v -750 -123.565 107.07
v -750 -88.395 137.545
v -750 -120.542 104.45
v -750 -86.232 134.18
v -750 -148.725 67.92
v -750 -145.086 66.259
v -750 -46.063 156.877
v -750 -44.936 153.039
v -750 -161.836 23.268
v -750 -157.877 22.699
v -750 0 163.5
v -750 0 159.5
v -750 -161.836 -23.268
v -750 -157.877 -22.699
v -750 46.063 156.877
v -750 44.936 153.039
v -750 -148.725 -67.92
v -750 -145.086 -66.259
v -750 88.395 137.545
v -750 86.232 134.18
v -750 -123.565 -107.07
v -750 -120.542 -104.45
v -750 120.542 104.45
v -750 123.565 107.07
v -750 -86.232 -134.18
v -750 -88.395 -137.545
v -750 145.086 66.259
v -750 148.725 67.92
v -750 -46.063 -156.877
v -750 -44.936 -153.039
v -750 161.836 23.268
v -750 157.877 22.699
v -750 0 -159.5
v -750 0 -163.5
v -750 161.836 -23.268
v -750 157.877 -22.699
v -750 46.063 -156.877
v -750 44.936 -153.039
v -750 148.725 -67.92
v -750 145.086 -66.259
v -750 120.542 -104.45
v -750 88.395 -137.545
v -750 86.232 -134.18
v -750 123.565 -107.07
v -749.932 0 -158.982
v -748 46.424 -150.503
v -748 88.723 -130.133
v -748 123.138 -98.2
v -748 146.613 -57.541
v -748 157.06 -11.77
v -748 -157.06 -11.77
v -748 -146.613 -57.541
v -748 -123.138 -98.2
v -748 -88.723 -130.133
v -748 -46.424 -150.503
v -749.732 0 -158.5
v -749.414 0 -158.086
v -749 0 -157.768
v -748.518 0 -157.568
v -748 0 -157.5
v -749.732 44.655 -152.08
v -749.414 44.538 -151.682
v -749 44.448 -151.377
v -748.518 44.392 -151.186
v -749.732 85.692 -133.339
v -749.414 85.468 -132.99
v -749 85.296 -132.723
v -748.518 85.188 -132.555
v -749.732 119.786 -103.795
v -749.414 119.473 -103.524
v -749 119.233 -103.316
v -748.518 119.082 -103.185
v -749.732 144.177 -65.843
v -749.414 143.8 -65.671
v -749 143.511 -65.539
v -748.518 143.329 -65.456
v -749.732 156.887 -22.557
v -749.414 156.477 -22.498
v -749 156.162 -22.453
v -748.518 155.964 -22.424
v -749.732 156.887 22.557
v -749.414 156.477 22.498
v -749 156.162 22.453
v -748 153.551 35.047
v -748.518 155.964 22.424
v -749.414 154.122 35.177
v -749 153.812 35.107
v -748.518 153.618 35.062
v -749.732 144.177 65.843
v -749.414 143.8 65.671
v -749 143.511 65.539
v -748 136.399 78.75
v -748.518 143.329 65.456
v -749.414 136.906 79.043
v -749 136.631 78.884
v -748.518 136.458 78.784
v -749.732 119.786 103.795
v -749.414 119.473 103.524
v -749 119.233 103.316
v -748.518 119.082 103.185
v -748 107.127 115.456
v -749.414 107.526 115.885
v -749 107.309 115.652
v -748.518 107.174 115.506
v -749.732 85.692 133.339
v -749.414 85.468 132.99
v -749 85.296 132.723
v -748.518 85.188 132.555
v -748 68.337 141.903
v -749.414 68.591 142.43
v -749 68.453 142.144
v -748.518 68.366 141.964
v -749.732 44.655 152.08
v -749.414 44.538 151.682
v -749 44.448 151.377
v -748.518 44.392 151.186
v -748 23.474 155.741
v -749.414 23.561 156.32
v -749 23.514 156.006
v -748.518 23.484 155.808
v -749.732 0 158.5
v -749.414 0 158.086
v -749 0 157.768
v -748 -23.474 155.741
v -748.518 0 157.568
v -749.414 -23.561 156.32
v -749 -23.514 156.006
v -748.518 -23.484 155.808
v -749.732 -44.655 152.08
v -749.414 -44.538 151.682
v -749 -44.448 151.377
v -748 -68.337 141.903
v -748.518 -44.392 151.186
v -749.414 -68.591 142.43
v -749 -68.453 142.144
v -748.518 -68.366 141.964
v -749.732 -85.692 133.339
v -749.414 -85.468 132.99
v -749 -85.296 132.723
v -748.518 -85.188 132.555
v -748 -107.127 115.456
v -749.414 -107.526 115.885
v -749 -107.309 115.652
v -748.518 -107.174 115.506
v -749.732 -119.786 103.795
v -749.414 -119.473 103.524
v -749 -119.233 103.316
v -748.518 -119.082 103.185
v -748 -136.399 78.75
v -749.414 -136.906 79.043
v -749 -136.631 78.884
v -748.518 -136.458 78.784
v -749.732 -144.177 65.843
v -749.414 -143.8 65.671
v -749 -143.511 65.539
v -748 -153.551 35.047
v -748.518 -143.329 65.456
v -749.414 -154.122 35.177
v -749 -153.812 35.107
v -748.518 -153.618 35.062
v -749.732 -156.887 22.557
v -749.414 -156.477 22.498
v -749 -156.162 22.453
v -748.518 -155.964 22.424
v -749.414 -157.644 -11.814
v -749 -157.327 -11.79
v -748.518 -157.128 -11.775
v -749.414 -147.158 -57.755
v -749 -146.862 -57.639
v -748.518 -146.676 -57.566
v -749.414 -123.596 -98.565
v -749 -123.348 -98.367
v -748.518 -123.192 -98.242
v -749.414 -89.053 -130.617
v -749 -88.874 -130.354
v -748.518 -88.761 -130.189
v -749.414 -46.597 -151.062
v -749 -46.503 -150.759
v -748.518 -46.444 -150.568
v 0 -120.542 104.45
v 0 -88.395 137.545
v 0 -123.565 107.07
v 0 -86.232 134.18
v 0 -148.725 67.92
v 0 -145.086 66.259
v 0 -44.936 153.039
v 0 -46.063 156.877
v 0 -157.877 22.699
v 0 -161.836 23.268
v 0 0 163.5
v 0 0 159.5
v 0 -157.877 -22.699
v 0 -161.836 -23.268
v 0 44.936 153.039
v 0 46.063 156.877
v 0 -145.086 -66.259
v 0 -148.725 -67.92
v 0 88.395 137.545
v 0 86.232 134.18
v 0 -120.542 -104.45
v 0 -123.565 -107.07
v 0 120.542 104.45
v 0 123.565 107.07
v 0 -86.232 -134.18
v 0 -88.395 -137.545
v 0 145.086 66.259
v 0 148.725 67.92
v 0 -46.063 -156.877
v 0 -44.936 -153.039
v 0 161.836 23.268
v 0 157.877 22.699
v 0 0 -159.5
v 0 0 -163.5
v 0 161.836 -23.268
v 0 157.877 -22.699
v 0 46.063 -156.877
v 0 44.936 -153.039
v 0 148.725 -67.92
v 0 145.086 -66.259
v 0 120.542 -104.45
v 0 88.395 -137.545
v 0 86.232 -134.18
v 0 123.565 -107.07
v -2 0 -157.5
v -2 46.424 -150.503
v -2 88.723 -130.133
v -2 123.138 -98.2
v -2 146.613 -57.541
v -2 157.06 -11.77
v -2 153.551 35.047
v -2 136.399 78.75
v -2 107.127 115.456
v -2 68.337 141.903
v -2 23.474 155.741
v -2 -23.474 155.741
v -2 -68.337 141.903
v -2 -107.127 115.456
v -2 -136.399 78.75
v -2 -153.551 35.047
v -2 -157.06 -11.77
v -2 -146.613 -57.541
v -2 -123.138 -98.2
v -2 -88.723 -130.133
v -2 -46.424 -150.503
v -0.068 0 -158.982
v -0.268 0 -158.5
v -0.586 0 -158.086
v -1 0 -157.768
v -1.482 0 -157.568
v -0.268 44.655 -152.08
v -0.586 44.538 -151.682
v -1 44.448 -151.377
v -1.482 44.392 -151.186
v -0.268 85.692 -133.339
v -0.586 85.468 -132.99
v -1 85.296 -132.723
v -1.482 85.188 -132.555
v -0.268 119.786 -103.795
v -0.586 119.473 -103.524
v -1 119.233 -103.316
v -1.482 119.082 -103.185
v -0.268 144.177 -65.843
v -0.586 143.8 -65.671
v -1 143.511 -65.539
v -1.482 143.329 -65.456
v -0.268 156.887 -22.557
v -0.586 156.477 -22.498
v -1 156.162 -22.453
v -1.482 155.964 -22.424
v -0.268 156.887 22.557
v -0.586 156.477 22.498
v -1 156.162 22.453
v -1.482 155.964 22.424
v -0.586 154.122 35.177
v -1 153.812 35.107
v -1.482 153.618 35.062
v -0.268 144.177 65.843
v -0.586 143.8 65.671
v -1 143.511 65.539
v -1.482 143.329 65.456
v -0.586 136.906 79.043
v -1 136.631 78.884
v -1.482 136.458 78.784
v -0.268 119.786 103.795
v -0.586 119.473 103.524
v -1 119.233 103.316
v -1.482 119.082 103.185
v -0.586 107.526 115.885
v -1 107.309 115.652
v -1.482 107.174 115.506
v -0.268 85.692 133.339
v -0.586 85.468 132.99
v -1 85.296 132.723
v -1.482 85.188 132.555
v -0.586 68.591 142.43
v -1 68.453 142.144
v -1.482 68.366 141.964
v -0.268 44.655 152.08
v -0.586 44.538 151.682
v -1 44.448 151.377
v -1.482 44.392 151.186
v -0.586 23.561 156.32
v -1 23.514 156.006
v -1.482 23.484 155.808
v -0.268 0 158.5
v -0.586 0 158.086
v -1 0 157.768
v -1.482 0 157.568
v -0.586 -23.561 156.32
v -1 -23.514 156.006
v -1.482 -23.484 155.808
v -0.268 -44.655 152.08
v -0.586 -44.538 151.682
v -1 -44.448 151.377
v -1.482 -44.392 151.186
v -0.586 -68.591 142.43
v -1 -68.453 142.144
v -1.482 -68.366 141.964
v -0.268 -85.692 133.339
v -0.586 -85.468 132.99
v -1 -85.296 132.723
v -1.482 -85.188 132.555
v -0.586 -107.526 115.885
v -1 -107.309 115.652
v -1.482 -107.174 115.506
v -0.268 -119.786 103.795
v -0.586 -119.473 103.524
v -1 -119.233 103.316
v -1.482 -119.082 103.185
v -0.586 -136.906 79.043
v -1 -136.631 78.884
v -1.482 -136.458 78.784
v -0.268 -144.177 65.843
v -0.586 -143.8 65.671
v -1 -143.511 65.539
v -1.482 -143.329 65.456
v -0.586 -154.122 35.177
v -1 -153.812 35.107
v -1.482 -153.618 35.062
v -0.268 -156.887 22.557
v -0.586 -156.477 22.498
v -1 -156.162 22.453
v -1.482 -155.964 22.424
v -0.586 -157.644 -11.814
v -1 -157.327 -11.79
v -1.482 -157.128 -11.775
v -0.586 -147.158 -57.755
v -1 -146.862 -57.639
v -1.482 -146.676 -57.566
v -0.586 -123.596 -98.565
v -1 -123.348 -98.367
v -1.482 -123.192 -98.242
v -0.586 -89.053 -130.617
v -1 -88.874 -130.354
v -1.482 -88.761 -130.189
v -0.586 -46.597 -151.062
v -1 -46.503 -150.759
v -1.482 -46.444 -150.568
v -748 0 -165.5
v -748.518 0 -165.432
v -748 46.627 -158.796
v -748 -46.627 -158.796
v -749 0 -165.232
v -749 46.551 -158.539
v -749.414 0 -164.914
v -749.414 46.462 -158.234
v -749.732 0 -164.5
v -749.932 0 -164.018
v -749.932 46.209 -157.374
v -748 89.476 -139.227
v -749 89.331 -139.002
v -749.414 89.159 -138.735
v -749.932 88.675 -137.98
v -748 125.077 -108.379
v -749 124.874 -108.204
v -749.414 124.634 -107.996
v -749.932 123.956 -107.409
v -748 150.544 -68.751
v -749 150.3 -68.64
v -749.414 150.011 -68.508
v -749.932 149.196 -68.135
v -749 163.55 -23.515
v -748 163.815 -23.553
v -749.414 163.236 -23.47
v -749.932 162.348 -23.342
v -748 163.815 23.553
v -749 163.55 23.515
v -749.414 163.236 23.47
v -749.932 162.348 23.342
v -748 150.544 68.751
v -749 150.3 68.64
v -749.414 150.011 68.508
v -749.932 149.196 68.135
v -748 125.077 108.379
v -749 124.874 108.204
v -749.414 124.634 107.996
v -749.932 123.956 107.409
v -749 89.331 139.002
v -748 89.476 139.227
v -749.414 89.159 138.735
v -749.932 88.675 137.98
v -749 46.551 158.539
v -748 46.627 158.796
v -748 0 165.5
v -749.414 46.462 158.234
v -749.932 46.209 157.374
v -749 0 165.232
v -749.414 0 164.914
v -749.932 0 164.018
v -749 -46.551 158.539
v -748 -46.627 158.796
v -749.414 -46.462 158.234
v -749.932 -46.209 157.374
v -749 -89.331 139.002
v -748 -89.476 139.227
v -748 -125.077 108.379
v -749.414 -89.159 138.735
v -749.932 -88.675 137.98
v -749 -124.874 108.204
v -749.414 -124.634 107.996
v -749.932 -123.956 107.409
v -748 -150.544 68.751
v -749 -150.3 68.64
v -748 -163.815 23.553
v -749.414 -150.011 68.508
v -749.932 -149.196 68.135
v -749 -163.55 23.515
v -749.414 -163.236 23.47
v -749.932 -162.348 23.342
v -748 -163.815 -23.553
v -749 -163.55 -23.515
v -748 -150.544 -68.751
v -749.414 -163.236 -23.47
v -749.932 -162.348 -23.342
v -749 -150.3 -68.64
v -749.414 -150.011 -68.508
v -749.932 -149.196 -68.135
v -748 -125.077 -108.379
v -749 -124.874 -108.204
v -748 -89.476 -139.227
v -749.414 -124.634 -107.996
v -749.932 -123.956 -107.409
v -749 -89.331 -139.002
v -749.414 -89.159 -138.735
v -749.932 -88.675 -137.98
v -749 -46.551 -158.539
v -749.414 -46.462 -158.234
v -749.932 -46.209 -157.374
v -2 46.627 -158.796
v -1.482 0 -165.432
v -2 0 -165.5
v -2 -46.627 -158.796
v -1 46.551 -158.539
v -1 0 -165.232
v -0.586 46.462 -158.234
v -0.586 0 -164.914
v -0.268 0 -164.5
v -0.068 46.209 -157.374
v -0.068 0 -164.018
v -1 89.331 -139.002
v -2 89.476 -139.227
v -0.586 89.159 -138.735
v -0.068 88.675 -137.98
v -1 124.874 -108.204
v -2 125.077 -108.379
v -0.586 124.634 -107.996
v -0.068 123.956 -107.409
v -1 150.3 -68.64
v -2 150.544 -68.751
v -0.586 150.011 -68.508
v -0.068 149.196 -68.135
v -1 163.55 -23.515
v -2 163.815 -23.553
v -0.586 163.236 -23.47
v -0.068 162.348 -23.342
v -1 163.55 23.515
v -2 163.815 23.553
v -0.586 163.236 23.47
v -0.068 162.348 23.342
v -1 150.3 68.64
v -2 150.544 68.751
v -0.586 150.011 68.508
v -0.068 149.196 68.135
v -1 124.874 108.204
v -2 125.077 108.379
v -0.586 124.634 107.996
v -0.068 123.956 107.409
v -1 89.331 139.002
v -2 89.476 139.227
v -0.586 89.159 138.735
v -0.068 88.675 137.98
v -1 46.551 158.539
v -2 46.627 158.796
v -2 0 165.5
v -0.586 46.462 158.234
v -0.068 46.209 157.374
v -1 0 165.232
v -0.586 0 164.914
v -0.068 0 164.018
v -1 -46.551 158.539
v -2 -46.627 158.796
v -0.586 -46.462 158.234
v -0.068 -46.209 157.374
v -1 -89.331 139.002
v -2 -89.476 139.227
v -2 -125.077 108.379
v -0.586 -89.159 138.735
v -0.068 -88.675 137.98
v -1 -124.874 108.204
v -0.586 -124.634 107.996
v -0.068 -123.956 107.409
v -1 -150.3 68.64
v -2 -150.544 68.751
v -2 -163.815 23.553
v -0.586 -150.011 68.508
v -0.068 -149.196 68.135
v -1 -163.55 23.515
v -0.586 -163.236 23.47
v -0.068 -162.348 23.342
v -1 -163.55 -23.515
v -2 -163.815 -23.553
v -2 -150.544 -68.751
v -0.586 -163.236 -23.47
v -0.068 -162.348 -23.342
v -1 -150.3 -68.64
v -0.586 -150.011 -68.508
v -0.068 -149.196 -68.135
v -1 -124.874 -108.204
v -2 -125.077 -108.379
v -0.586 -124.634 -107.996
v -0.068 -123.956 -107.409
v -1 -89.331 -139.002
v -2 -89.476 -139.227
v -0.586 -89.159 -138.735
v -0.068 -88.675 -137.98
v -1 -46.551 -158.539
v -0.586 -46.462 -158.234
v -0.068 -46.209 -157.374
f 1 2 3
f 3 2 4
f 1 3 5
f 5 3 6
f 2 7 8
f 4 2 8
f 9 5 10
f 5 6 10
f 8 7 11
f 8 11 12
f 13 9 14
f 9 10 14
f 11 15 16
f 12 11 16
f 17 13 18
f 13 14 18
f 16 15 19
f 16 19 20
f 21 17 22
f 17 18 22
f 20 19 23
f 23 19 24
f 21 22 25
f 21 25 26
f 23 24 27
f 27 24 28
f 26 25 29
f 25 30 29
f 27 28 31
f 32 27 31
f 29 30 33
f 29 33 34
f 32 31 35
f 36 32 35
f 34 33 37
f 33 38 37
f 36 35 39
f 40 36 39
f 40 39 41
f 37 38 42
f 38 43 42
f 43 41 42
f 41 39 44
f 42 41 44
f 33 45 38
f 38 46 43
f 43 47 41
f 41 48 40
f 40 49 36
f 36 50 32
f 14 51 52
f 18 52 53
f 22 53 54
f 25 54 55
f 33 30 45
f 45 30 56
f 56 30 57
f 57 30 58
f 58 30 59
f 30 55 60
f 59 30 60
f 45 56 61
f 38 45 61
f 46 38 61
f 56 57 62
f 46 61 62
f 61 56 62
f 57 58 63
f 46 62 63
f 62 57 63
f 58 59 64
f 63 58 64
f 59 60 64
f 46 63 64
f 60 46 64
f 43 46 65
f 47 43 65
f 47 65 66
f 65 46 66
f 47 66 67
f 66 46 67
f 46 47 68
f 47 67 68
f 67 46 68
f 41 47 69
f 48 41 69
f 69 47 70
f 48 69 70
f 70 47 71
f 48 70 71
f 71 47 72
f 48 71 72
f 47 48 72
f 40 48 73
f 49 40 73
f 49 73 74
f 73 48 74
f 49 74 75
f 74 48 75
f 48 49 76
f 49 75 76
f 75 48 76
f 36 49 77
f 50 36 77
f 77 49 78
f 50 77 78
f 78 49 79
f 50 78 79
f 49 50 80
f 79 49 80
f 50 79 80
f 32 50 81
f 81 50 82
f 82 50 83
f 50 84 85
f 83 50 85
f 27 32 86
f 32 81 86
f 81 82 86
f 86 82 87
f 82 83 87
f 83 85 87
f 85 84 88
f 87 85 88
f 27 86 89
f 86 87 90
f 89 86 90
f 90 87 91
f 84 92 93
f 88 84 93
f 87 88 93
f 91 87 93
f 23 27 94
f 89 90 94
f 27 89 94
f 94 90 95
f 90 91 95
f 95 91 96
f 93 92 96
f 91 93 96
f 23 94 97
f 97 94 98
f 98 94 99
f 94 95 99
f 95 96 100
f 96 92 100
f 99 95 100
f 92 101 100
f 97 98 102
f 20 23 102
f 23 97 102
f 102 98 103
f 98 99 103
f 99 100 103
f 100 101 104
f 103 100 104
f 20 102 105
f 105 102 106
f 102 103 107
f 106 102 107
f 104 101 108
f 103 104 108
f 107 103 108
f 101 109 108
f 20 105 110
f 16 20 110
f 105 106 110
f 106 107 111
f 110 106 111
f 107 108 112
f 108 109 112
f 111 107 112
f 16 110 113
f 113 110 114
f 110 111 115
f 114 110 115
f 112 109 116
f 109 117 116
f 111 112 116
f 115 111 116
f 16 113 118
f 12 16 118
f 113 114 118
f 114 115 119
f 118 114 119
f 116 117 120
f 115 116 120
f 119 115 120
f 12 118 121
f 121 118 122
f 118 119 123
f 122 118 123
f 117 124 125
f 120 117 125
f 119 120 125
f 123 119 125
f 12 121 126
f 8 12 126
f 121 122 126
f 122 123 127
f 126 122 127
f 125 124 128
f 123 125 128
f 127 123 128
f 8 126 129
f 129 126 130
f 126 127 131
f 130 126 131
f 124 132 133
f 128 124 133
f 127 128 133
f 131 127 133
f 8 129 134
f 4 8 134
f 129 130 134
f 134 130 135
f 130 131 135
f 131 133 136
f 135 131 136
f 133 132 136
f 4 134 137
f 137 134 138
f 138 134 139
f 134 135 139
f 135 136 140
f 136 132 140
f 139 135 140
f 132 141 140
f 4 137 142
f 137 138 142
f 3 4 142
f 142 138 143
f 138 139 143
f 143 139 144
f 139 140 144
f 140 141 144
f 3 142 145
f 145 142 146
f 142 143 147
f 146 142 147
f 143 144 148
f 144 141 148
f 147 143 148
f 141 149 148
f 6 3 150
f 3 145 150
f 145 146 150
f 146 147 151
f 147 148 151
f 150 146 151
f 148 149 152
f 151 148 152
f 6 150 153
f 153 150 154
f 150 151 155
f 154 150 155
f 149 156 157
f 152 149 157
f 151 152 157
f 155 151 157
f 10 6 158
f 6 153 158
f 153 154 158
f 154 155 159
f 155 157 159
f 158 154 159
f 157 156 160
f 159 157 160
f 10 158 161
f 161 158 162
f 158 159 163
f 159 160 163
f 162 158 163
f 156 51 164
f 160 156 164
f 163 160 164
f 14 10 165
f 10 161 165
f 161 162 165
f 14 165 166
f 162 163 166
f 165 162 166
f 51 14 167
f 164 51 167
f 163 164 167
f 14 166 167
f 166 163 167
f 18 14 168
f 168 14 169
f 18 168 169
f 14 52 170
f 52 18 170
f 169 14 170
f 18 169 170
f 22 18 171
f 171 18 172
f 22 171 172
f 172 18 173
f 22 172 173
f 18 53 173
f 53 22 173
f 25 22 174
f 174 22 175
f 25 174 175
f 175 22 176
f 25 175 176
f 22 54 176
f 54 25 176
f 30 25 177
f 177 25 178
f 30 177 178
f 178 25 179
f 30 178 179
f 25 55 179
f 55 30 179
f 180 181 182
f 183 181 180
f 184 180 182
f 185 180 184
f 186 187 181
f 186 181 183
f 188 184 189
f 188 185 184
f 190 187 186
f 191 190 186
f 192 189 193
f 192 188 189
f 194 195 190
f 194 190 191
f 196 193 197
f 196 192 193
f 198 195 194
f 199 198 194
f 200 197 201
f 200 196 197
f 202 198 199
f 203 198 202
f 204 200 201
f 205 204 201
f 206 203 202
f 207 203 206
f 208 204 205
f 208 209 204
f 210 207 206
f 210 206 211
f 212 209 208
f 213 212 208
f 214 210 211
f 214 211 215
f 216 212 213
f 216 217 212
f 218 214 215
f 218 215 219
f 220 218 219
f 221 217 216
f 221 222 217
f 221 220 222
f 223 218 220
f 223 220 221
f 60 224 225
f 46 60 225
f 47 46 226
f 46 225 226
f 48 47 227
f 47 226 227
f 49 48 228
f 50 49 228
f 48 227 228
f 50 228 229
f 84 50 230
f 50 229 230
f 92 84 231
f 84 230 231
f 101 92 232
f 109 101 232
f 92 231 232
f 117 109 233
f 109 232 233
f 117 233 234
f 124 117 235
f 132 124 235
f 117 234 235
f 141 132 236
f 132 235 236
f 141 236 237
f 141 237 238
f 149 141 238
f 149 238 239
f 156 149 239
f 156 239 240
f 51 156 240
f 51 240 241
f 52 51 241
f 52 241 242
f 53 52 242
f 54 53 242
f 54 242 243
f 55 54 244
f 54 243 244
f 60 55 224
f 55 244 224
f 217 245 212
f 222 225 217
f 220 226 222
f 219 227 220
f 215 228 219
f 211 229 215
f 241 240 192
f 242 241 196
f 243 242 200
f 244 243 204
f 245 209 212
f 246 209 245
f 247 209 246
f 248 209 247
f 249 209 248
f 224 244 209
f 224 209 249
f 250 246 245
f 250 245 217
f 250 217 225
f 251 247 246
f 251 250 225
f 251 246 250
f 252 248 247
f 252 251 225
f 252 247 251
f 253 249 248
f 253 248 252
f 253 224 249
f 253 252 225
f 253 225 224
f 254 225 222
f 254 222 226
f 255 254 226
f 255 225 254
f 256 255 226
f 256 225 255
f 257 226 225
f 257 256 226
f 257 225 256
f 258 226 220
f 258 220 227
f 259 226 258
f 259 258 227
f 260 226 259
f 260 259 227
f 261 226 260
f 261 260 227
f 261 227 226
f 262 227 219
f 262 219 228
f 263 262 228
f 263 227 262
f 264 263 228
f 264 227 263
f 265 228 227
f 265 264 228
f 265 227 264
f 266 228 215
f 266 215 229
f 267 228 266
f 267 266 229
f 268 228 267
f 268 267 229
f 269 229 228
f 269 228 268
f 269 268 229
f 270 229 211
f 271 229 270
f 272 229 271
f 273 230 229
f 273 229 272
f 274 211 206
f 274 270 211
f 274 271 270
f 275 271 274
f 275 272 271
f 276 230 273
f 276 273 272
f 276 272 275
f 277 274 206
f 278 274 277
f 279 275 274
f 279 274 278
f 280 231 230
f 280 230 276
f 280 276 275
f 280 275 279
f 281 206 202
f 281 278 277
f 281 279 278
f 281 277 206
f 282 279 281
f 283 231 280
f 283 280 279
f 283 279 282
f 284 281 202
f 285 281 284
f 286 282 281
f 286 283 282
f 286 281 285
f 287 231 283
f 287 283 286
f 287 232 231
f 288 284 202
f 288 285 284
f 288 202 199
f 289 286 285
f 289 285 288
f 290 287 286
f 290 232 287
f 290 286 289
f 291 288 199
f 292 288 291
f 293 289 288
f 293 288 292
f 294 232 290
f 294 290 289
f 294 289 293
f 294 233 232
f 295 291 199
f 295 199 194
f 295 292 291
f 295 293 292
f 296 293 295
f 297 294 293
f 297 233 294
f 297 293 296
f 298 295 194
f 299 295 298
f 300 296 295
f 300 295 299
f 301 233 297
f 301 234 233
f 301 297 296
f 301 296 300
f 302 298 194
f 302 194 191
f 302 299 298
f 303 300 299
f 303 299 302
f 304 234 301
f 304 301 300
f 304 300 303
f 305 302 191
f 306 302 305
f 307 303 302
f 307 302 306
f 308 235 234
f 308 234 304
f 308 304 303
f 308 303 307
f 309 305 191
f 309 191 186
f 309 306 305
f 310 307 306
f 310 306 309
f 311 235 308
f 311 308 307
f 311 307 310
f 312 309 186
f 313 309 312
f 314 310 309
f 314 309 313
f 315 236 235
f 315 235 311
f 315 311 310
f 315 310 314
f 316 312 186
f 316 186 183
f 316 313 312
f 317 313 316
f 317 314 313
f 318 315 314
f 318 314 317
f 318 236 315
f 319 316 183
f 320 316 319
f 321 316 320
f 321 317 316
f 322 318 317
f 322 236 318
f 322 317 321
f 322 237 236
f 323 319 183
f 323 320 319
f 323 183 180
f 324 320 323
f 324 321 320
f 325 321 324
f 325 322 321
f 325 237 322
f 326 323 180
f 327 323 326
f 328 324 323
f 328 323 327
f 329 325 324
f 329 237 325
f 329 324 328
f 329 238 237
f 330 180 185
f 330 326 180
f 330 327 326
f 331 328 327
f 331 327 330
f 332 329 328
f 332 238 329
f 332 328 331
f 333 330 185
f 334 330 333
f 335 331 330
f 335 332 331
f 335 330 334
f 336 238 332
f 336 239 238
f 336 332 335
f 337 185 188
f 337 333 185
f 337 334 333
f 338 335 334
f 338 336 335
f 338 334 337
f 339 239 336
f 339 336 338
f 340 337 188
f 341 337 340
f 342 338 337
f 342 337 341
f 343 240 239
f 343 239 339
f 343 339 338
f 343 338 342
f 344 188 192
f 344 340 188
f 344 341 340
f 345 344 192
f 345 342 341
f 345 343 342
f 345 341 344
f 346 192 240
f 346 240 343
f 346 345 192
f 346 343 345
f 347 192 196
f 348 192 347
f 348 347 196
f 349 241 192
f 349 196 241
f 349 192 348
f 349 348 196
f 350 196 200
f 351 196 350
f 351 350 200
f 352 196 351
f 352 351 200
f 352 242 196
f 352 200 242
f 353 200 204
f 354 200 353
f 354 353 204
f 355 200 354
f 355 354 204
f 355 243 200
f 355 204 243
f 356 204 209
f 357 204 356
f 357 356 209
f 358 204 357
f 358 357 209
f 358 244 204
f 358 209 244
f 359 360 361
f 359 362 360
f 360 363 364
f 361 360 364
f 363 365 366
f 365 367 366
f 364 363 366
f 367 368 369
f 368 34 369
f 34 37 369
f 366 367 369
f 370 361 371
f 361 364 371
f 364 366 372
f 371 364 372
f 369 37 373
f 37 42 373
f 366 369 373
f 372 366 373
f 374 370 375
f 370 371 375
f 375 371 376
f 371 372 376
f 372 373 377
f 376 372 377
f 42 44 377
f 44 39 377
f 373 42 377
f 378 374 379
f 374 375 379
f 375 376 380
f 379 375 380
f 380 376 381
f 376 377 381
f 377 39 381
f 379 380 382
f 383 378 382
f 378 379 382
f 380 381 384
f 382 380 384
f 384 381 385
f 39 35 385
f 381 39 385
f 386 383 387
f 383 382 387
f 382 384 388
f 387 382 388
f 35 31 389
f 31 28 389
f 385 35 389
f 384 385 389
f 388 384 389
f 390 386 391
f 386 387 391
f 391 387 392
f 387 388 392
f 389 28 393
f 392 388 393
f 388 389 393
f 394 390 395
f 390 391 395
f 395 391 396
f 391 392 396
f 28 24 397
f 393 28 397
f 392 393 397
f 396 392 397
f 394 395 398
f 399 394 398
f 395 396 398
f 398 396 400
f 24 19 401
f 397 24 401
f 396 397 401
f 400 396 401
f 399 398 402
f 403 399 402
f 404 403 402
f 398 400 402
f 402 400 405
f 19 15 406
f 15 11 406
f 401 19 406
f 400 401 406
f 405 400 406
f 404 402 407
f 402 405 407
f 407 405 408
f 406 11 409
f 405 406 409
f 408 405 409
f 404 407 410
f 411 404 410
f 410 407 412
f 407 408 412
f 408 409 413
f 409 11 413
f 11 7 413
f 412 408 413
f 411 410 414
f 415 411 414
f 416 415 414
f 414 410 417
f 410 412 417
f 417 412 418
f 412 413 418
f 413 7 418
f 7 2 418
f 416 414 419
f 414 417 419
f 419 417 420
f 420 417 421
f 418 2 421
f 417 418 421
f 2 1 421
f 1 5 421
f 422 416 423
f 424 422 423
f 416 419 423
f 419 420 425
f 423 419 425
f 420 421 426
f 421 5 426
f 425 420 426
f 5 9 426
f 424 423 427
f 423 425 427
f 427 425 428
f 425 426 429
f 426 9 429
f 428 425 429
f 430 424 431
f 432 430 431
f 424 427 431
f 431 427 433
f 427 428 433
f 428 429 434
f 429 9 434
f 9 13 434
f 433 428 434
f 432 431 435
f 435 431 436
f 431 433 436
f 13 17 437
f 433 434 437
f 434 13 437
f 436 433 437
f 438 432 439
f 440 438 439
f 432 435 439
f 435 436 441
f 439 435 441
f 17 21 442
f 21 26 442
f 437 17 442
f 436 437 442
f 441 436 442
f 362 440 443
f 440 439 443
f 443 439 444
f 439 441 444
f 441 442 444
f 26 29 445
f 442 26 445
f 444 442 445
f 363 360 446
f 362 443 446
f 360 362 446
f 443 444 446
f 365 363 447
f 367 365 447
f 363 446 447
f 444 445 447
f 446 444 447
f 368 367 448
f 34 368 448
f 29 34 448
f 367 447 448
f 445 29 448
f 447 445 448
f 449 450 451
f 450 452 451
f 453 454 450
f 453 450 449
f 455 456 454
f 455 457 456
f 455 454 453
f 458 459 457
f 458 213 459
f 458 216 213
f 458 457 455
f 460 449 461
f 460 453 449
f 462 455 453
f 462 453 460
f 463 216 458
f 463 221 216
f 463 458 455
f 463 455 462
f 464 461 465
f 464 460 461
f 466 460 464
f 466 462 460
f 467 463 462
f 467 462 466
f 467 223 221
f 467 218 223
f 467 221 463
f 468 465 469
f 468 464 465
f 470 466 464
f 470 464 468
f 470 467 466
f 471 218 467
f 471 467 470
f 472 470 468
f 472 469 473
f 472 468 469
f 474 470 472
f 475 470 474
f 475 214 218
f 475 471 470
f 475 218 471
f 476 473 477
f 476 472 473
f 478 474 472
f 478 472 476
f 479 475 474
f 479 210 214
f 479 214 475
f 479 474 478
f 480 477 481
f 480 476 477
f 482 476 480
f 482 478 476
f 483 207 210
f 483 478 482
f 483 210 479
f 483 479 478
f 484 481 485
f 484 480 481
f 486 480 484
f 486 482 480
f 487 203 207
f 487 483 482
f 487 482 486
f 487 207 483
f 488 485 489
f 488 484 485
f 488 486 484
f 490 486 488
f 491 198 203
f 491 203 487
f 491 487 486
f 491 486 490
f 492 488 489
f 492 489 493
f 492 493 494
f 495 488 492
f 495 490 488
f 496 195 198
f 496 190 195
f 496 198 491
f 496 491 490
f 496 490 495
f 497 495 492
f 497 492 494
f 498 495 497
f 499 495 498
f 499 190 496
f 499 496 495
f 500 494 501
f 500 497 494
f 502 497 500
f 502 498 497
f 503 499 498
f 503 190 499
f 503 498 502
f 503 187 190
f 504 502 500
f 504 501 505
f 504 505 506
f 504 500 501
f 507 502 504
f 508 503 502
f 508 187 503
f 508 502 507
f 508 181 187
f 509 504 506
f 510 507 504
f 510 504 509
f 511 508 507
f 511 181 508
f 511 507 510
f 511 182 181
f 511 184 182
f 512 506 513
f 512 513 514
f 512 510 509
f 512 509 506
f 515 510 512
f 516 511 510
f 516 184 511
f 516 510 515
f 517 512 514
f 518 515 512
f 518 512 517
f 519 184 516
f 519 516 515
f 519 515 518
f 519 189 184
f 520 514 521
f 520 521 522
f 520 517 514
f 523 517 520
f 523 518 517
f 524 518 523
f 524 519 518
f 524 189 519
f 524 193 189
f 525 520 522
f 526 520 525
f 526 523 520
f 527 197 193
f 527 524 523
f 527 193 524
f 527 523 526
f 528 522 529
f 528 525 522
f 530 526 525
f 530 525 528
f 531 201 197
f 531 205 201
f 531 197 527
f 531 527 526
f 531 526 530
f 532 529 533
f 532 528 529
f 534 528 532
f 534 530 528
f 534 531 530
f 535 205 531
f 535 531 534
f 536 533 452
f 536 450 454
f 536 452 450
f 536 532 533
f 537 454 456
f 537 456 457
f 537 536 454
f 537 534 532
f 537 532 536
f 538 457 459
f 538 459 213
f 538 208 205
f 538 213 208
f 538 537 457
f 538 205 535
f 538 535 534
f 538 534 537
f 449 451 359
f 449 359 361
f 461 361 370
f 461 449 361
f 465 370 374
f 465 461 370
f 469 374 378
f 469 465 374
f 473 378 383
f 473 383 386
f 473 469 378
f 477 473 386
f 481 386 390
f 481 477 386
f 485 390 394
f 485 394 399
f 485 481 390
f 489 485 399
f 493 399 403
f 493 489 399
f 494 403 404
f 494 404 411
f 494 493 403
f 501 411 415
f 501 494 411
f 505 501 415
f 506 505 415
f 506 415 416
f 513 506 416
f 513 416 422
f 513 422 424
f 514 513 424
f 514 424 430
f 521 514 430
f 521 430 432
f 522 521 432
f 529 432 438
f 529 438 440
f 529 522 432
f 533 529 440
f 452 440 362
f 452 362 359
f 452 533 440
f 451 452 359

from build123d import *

# Parameters (mm, degrees)
SKETCH1_R           = 165.5
BOSS_EXTRUDE1_DEPTH = 750
SKETCH2_R           = 157.5
CUT_EXTRUDE1_DEPTH  = 750
FILLET1_R           = 2
FILLET2_R           = 2


with BuildPart() as part:
    # Sketch1 → Boss-Extrude1 (new body)
    with BuildSketch(Plane(origin=(0, 0, 0), x_dir=(0, 0, -1), z_dir=(1, 0, 0))):
        Circle(SKETCH1_R)
    extrude(amount=-BOSS_EXTRUDE1_DEPTH)

    # Sketch2 → Cut-Extrude1 (cut)
    with BuildSketch(Plane(origin=(0, 0, 0), x_dir=(0, 0, -1), z_dir=(1, 0, 0))):
        Circle(SKETCH2_R)
    extrude(amount=-CUT_EXTRUDE1_DEPTH, mode=Mode.SUBTRACT)

    # Fillet1
    fillet1_edges = [part.edges().sort_by_distance(p)[0] for p in [
        (0, 0, 165.5),
        (0, 0, 157.5),
    ]]
    fillet(fillet1_edges, radius=FILLET1_R)

    # Fillet2
    fillet2_edges = [part.edges().sort_by_distance(p)[0] for p in [
        (-750, 0, 165.5),
        (-750, 0, 157.5),
    ]]
    fillet(fillet2_edges, radius=FILLET2_R)


solid = part.part
